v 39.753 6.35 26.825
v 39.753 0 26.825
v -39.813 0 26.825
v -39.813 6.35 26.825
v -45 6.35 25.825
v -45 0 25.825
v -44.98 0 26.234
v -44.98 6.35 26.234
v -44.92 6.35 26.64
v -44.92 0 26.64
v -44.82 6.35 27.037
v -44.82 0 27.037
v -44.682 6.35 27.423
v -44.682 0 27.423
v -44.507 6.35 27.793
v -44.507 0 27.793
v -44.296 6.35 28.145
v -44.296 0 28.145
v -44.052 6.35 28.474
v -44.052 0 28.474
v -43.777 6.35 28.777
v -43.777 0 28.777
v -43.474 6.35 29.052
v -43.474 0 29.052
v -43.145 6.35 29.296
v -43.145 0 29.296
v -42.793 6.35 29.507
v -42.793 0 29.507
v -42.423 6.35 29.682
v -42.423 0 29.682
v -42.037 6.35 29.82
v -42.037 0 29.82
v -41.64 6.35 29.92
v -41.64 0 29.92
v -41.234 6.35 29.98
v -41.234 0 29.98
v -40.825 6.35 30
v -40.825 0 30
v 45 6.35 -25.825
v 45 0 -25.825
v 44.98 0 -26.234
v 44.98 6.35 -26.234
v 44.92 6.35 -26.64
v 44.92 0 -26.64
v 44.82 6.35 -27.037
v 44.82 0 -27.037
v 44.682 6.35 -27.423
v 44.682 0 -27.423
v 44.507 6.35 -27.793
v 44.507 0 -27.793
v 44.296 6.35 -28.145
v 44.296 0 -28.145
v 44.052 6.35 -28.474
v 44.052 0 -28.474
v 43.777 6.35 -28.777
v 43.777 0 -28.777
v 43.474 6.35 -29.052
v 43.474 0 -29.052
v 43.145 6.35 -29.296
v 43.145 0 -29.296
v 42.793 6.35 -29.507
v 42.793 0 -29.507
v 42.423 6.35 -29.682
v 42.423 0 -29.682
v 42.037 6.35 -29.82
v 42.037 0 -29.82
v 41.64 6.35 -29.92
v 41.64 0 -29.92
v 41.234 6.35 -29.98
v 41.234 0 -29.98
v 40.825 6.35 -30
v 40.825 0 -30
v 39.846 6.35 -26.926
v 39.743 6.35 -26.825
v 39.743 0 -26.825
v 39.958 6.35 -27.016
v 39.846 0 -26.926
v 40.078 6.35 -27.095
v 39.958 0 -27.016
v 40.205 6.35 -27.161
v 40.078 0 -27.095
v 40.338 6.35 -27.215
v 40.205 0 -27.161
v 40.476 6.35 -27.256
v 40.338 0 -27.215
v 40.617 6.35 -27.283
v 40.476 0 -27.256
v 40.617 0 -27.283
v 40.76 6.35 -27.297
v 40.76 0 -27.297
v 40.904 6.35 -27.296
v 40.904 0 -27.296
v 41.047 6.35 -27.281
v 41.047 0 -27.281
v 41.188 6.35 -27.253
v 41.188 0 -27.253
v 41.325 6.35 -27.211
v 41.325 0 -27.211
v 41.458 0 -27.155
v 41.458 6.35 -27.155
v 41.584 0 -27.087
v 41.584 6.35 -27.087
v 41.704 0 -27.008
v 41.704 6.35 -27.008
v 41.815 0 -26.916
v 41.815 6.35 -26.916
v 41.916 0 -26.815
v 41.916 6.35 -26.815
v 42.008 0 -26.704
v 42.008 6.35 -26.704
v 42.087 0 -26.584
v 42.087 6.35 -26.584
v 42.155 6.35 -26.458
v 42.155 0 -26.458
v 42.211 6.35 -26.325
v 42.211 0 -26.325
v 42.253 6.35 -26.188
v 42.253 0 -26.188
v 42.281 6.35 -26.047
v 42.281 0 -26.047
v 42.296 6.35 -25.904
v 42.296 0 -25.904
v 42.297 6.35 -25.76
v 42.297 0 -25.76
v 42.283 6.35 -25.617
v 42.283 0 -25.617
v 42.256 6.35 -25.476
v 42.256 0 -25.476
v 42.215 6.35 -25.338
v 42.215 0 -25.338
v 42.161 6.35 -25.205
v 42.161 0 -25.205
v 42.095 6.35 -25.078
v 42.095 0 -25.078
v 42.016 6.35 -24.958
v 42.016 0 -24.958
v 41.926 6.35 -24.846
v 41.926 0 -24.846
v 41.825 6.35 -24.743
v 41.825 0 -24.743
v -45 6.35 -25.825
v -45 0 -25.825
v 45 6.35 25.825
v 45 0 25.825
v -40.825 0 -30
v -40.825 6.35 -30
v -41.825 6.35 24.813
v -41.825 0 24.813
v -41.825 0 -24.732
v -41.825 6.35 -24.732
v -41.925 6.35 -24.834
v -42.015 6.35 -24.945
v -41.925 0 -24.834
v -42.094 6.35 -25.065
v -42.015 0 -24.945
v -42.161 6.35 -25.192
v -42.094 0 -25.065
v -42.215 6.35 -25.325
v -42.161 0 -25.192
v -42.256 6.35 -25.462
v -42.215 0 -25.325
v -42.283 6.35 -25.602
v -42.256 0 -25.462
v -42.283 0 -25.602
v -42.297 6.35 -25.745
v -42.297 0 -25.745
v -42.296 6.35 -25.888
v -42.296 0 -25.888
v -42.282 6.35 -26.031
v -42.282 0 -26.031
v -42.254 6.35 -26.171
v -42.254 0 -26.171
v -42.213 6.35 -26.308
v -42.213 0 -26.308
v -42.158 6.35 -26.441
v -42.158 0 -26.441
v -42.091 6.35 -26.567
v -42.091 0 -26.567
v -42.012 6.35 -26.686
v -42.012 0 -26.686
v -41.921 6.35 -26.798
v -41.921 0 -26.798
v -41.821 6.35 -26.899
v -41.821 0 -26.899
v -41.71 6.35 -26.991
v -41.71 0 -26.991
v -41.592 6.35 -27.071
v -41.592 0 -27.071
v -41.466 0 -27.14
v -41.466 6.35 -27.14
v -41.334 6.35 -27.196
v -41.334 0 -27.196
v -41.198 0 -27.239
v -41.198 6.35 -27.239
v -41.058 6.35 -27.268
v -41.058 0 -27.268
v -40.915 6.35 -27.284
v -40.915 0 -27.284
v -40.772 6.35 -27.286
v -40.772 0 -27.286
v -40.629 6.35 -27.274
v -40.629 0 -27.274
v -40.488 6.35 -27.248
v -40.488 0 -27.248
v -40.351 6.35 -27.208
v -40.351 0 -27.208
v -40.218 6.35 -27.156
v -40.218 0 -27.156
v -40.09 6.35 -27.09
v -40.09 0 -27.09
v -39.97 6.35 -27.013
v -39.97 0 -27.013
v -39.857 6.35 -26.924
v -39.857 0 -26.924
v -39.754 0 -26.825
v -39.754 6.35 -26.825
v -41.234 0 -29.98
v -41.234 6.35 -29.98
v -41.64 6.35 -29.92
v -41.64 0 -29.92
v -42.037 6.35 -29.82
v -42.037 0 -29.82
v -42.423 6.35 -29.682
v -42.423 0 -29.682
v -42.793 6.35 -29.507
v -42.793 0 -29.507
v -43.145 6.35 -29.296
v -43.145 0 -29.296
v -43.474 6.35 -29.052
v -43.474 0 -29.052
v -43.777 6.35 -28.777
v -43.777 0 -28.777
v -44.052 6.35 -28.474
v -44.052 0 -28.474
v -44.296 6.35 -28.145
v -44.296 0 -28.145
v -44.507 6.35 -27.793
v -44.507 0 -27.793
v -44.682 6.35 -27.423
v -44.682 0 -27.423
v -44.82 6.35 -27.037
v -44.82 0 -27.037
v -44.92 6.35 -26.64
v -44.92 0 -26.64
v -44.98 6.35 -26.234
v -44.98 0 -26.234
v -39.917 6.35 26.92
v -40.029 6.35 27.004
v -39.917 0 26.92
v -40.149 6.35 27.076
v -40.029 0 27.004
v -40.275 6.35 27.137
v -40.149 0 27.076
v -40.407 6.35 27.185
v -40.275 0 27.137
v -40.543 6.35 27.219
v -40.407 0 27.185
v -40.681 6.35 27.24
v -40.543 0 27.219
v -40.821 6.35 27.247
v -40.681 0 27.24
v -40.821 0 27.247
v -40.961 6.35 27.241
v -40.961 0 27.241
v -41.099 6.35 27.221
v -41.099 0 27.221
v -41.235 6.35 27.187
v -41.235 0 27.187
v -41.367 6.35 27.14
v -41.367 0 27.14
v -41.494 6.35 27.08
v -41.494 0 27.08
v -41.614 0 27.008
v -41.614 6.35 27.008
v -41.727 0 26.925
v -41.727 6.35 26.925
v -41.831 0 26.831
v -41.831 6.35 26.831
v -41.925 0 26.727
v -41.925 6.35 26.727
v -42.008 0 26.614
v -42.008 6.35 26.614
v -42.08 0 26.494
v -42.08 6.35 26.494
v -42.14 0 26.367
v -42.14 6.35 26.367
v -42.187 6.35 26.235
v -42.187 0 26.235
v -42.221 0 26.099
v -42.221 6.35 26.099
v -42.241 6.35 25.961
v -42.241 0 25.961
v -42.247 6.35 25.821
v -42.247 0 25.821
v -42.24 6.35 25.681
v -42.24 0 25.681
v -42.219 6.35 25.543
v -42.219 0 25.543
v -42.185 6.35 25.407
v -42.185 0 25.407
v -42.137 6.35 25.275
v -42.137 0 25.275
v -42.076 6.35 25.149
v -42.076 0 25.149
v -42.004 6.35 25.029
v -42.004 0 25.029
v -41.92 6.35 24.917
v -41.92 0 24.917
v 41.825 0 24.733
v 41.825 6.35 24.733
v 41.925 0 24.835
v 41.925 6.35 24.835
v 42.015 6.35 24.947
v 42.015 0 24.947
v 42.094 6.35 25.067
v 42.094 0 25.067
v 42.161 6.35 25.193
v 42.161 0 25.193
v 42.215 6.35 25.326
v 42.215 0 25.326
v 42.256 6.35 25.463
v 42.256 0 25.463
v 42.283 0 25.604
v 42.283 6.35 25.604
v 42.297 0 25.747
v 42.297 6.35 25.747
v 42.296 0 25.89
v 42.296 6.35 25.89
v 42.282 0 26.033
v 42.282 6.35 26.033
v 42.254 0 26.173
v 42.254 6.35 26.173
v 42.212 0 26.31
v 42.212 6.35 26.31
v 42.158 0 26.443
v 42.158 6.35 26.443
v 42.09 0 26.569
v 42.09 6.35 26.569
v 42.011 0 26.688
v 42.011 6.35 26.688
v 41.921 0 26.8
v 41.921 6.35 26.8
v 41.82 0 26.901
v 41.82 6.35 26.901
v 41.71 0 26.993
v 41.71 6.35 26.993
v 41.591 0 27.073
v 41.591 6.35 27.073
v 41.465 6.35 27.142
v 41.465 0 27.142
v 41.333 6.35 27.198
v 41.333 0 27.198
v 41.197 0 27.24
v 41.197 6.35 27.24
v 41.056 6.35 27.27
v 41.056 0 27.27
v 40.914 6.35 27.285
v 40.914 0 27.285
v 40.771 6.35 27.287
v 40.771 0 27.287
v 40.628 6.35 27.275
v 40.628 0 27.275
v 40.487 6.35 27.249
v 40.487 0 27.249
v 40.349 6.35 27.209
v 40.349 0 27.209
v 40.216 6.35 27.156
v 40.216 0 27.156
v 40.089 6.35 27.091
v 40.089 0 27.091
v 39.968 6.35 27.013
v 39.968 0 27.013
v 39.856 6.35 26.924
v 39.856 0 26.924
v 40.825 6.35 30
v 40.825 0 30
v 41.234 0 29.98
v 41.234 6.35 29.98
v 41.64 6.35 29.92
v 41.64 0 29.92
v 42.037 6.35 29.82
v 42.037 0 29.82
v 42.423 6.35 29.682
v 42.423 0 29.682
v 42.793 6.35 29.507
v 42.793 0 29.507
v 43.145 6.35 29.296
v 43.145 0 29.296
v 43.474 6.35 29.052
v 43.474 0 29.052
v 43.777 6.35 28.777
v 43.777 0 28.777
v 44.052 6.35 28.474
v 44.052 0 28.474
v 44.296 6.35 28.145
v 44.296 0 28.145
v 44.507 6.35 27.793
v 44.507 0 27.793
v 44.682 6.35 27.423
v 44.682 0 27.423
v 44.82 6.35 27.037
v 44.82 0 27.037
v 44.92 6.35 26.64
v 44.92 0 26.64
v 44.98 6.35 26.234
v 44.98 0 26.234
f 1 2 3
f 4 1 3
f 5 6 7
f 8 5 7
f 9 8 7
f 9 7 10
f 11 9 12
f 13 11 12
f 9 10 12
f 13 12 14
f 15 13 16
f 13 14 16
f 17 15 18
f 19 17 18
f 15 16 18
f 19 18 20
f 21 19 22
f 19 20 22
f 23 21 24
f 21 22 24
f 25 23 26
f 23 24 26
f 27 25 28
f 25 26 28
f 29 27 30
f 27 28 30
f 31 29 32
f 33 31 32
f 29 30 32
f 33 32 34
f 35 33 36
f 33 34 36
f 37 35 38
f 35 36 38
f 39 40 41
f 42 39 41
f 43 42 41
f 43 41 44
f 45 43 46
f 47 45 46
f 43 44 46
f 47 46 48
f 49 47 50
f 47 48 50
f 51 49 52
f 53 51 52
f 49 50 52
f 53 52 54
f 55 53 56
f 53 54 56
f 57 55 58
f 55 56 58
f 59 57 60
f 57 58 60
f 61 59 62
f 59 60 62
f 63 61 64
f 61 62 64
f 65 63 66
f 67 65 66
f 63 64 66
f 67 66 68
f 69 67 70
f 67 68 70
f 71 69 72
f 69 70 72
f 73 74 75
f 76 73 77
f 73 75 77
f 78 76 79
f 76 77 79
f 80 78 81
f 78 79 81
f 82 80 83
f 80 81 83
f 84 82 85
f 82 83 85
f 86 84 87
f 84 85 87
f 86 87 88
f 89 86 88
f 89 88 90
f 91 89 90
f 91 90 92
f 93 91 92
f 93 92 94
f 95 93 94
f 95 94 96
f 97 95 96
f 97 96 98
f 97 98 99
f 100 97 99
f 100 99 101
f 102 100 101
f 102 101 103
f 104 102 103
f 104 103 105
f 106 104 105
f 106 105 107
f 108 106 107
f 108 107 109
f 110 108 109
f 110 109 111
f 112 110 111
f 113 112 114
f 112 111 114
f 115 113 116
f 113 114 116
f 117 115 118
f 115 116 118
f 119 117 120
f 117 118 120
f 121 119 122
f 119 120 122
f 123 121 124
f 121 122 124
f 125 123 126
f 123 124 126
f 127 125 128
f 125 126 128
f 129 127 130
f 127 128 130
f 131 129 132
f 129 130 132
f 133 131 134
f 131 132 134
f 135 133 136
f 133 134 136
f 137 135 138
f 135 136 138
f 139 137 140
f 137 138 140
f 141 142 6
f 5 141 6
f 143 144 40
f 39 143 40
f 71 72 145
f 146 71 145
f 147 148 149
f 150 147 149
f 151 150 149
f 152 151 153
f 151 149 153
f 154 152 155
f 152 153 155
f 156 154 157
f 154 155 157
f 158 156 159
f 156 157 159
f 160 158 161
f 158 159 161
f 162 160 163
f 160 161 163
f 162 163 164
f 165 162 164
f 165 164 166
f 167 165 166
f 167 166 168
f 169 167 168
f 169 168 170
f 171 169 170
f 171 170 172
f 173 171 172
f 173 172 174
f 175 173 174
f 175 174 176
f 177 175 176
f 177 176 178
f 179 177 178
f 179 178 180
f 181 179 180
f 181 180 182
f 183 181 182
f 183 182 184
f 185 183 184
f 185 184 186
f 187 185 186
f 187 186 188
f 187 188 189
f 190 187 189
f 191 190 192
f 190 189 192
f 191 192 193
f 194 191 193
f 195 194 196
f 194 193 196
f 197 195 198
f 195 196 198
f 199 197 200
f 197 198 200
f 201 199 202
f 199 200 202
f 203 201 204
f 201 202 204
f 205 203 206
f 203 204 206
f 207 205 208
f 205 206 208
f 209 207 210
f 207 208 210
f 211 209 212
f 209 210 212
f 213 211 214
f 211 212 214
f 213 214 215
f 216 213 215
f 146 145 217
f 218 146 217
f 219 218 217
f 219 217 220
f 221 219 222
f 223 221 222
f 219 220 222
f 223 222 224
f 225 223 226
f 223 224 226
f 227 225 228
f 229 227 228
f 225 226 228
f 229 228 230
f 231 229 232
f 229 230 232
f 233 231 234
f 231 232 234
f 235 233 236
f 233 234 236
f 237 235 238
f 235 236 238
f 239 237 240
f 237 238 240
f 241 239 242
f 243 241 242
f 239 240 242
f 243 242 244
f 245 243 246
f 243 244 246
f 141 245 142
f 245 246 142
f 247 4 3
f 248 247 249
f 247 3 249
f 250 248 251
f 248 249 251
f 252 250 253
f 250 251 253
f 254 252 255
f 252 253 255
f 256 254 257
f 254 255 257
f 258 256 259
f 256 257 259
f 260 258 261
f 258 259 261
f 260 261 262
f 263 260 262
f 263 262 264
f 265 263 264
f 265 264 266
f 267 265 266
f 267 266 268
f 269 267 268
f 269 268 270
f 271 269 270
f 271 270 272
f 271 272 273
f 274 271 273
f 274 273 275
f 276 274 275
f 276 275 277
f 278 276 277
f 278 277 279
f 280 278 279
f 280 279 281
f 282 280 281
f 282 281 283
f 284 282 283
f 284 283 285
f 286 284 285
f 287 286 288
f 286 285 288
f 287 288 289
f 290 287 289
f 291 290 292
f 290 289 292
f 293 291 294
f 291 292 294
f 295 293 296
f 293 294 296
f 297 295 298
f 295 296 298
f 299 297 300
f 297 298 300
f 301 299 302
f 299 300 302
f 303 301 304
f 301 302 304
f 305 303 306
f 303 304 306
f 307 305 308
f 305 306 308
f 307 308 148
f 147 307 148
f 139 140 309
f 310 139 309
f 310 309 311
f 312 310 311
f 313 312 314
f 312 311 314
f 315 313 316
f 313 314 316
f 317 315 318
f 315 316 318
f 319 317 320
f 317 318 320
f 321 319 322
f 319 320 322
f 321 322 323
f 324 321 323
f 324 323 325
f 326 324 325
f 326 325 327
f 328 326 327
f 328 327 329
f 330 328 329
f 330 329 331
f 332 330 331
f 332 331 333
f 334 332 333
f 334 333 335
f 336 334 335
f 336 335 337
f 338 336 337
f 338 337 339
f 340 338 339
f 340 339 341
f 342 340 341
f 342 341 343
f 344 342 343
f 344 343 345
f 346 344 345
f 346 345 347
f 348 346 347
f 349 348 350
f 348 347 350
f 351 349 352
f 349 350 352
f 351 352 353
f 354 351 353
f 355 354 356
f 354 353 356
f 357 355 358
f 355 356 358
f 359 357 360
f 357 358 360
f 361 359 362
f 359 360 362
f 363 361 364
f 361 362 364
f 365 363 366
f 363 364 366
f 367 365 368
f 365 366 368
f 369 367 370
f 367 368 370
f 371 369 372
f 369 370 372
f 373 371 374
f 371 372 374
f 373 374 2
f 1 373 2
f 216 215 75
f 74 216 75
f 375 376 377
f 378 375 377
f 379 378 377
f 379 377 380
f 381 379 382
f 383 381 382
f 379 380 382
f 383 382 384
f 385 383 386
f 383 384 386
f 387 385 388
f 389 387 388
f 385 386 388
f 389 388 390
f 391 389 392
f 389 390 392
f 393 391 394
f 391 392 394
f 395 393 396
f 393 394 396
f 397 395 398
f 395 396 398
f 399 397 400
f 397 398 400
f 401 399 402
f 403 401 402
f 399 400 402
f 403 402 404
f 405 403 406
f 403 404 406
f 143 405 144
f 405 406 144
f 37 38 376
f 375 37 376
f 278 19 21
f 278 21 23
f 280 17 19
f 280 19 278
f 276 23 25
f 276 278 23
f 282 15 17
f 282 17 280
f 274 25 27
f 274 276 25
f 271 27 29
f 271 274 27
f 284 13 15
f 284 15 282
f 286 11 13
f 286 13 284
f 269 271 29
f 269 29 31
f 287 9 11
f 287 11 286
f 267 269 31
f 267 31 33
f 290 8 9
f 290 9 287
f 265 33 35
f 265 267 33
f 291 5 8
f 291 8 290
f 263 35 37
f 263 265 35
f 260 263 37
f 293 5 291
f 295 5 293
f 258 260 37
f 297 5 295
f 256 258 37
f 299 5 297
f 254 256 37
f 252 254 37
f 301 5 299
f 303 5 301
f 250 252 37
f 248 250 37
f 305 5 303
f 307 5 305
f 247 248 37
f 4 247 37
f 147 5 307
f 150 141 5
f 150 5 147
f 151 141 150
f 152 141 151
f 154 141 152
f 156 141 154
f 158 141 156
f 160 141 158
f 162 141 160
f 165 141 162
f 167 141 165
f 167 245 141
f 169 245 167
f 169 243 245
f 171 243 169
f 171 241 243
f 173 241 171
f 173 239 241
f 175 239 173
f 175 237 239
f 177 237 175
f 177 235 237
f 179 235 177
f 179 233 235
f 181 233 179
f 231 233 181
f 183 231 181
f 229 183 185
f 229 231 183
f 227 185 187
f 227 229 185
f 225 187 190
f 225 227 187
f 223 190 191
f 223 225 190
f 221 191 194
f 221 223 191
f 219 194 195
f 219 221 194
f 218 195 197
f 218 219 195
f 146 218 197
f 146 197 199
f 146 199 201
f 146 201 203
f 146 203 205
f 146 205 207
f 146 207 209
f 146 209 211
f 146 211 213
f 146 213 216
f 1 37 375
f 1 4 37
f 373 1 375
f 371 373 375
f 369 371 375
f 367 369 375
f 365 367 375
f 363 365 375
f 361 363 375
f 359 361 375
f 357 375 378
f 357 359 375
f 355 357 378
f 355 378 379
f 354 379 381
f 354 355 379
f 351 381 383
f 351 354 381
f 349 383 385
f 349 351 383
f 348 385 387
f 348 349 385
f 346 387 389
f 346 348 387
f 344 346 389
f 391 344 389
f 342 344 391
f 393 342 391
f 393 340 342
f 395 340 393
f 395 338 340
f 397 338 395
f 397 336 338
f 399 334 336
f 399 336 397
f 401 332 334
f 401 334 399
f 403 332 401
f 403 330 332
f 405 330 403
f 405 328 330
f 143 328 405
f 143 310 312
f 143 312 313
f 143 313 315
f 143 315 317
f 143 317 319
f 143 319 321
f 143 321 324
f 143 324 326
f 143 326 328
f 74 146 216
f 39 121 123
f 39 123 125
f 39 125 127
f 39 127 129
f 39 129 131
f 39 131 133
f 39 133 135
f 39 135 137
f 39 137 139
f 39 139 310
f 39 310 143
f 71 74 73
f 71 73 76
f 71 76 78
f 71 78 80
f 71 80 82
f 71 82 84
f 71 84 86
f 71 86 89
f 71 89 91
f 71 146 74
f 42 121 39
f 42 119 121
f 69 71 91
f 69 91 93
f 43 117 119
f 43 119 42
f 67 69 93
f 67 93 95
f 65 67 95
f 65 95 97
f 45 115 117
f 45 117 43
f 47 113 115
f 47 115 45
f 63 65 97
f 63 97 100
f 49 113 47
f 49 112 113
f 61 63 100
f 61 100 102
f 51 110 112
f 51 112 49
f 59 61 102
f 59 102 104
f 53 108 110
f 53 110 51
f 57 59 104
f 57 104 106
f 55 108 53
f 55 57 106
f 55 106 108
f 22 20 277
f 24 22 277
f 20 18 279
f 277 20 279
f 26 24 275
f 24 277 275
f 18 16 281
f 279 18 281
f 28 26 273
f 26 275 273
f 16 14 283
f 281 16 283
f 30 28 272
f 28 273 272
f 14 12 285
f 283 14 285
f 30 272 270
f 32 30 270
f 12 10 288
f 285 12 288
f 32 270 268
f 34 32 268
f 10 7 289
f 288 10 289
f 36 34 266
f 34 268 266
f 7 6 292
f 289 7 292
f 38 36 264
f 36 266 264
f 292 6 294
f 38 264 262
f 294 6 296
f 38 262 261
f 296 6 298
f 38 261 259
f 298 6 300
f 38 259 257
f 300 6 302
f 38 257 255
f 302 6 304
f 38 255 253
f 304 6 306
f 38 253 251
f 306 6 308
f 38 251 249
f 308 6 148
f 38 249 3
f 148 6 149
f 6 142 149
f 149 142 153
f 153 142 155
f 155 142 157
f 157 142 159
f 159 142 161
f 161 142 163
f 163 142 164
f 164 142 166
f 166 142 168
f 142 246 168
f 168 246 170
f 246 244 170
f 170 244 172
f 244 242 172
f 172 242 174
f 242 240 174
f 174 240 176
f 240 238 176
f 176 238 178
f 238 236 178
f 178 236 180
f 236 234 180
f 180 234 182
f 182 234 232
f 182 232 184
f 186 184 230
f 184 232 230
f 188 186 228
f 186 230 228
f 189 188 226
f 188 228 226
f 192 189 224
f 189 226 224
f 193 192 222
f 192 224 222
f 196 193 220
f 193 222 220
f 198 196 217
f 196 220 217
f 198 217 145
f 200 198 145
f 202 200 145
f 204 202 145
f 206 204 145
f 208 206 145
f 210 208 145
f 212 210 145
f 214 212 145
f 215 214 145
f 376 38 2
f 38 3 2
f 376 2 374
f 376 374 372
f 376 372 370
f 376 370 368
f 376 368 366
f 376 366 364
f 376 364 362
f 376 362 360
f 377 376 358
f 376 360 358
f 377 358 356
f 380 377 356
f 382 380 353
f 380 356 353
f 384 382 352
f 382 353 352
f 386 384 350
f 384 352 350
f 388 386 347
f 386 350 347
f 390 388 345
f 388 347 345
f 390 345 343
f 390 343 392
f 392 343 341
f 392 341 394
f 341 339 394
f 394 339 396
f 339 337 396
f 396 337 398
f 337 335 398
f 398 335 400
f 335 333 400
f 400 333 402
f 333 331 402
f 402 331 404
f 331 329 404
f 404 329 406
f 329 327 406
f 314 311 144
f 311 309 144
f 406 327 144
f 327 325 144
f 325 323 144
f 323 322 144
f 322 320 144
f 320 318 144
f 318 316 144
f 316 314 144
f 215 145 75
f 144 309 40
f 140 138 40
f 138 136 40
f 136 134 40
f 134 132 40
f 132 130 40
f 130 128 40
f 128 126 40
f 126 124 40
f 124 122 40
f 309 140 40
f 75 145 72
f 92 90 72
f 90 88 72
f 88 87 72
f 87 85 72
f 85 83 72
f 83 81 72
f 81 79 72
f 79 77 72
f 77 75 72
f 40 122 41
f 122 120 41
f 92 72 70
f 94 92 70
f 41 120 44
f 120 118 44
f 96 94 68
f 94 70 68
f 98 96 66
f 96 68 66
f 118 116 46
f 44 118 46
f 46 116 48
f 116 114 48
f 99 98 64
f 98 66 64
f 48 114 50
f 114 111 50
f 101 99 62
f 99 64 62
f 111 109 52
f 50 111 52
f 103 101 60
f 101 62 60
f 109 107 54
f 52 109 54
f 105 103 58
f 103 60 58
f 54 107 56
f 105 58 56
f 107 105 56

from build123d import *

# Parameters (mm, degrees)
BOSS_EXTRUDE3_DEPTH = 6.35
SKETCH5_R           = 1.4224
SKETCH5_R_2         = 1.4732
CUT_EXTRUDE2_DEPTH  = 55.454774814


with BuildPart() as part:
    # Sketch2 → Boss-Extrude3 (new body)
    with BuildSketch(Plane(origin=(0, 0, 0), x_dir=(1, 0, 0), z_dir=(0, 1, 0))):
        with BuildLine():
            Line((-45, 25.825), (-45, -25.825))
            ThreePointArc((-45, -25.825), (-43.777170811, -28.777170811), (-40.825, -30))
            Line((-40.825, -30), (40.825, -30))
            ThreePointArc((40.825, -30), (43.777170811, -28.777170811), (45, -25.825))
            Line((45, -25.825), (45, 25.825))
            ThreePointArc((45, 25.825), (43.777170811, 28.777170811), (40.825, 30))
            Line((40.825, 30), (-40.825, 30))
            ThreePointArc((-40.825, 30), (-43.777170811, 28.777170811), (-45, 25.825))
        make_face()
        with BuildLine():
            Line((-41.825, -25.825), (-41.825, 25.825))
            ThreePointArc((-41.825, 25.825), (-41.532106781, 26.532106781), (-40.825, 26.825))
            Line((-40.825, 26.825), (40.825, 26.825))
            ThreePointArc((40.825, 26.825), (41.532106781, 26.532106781), (41.825, 25.825))
            Line((41.825, 25.825), (41.825, -25.825))
            ThreePointArc((41.825, -25.825), (41.532106781, -26.532106781), (40.825, -26.825))
            Line((40.825, -26.825), (-40.825, -26.825))
            ThreePointArc((-40.825, -26.825), (-41.532106781, -26.532106781), (-41.825, -25.825))
        make_face(mode=Mode.SUBTRACT)
    extrude(amount=BOSS_EXTRUDE3_DEPTH)

    # Sketch5 → Cut-Extrude2 (cut, through all)
    with BuildSketch(Plane.XZ):
        with Locations((-40.825, 25.825)):
            Circle(SKETCH5_R)
        with Locations((40.825, 25.81487963)):
            Circle(SKETCH5_R_2)
        with Locations((40.825, -25.825)):
            Circle(SKETCH5_R_2)
        with Locations((-40.825, -25.81356336)):
            Circle(SKETCH5_R_2)
    extrude(amount=-CUT_EXTRUDE2_DEPTH, mode=Mode.SUBTRACT)


solid = part.part
